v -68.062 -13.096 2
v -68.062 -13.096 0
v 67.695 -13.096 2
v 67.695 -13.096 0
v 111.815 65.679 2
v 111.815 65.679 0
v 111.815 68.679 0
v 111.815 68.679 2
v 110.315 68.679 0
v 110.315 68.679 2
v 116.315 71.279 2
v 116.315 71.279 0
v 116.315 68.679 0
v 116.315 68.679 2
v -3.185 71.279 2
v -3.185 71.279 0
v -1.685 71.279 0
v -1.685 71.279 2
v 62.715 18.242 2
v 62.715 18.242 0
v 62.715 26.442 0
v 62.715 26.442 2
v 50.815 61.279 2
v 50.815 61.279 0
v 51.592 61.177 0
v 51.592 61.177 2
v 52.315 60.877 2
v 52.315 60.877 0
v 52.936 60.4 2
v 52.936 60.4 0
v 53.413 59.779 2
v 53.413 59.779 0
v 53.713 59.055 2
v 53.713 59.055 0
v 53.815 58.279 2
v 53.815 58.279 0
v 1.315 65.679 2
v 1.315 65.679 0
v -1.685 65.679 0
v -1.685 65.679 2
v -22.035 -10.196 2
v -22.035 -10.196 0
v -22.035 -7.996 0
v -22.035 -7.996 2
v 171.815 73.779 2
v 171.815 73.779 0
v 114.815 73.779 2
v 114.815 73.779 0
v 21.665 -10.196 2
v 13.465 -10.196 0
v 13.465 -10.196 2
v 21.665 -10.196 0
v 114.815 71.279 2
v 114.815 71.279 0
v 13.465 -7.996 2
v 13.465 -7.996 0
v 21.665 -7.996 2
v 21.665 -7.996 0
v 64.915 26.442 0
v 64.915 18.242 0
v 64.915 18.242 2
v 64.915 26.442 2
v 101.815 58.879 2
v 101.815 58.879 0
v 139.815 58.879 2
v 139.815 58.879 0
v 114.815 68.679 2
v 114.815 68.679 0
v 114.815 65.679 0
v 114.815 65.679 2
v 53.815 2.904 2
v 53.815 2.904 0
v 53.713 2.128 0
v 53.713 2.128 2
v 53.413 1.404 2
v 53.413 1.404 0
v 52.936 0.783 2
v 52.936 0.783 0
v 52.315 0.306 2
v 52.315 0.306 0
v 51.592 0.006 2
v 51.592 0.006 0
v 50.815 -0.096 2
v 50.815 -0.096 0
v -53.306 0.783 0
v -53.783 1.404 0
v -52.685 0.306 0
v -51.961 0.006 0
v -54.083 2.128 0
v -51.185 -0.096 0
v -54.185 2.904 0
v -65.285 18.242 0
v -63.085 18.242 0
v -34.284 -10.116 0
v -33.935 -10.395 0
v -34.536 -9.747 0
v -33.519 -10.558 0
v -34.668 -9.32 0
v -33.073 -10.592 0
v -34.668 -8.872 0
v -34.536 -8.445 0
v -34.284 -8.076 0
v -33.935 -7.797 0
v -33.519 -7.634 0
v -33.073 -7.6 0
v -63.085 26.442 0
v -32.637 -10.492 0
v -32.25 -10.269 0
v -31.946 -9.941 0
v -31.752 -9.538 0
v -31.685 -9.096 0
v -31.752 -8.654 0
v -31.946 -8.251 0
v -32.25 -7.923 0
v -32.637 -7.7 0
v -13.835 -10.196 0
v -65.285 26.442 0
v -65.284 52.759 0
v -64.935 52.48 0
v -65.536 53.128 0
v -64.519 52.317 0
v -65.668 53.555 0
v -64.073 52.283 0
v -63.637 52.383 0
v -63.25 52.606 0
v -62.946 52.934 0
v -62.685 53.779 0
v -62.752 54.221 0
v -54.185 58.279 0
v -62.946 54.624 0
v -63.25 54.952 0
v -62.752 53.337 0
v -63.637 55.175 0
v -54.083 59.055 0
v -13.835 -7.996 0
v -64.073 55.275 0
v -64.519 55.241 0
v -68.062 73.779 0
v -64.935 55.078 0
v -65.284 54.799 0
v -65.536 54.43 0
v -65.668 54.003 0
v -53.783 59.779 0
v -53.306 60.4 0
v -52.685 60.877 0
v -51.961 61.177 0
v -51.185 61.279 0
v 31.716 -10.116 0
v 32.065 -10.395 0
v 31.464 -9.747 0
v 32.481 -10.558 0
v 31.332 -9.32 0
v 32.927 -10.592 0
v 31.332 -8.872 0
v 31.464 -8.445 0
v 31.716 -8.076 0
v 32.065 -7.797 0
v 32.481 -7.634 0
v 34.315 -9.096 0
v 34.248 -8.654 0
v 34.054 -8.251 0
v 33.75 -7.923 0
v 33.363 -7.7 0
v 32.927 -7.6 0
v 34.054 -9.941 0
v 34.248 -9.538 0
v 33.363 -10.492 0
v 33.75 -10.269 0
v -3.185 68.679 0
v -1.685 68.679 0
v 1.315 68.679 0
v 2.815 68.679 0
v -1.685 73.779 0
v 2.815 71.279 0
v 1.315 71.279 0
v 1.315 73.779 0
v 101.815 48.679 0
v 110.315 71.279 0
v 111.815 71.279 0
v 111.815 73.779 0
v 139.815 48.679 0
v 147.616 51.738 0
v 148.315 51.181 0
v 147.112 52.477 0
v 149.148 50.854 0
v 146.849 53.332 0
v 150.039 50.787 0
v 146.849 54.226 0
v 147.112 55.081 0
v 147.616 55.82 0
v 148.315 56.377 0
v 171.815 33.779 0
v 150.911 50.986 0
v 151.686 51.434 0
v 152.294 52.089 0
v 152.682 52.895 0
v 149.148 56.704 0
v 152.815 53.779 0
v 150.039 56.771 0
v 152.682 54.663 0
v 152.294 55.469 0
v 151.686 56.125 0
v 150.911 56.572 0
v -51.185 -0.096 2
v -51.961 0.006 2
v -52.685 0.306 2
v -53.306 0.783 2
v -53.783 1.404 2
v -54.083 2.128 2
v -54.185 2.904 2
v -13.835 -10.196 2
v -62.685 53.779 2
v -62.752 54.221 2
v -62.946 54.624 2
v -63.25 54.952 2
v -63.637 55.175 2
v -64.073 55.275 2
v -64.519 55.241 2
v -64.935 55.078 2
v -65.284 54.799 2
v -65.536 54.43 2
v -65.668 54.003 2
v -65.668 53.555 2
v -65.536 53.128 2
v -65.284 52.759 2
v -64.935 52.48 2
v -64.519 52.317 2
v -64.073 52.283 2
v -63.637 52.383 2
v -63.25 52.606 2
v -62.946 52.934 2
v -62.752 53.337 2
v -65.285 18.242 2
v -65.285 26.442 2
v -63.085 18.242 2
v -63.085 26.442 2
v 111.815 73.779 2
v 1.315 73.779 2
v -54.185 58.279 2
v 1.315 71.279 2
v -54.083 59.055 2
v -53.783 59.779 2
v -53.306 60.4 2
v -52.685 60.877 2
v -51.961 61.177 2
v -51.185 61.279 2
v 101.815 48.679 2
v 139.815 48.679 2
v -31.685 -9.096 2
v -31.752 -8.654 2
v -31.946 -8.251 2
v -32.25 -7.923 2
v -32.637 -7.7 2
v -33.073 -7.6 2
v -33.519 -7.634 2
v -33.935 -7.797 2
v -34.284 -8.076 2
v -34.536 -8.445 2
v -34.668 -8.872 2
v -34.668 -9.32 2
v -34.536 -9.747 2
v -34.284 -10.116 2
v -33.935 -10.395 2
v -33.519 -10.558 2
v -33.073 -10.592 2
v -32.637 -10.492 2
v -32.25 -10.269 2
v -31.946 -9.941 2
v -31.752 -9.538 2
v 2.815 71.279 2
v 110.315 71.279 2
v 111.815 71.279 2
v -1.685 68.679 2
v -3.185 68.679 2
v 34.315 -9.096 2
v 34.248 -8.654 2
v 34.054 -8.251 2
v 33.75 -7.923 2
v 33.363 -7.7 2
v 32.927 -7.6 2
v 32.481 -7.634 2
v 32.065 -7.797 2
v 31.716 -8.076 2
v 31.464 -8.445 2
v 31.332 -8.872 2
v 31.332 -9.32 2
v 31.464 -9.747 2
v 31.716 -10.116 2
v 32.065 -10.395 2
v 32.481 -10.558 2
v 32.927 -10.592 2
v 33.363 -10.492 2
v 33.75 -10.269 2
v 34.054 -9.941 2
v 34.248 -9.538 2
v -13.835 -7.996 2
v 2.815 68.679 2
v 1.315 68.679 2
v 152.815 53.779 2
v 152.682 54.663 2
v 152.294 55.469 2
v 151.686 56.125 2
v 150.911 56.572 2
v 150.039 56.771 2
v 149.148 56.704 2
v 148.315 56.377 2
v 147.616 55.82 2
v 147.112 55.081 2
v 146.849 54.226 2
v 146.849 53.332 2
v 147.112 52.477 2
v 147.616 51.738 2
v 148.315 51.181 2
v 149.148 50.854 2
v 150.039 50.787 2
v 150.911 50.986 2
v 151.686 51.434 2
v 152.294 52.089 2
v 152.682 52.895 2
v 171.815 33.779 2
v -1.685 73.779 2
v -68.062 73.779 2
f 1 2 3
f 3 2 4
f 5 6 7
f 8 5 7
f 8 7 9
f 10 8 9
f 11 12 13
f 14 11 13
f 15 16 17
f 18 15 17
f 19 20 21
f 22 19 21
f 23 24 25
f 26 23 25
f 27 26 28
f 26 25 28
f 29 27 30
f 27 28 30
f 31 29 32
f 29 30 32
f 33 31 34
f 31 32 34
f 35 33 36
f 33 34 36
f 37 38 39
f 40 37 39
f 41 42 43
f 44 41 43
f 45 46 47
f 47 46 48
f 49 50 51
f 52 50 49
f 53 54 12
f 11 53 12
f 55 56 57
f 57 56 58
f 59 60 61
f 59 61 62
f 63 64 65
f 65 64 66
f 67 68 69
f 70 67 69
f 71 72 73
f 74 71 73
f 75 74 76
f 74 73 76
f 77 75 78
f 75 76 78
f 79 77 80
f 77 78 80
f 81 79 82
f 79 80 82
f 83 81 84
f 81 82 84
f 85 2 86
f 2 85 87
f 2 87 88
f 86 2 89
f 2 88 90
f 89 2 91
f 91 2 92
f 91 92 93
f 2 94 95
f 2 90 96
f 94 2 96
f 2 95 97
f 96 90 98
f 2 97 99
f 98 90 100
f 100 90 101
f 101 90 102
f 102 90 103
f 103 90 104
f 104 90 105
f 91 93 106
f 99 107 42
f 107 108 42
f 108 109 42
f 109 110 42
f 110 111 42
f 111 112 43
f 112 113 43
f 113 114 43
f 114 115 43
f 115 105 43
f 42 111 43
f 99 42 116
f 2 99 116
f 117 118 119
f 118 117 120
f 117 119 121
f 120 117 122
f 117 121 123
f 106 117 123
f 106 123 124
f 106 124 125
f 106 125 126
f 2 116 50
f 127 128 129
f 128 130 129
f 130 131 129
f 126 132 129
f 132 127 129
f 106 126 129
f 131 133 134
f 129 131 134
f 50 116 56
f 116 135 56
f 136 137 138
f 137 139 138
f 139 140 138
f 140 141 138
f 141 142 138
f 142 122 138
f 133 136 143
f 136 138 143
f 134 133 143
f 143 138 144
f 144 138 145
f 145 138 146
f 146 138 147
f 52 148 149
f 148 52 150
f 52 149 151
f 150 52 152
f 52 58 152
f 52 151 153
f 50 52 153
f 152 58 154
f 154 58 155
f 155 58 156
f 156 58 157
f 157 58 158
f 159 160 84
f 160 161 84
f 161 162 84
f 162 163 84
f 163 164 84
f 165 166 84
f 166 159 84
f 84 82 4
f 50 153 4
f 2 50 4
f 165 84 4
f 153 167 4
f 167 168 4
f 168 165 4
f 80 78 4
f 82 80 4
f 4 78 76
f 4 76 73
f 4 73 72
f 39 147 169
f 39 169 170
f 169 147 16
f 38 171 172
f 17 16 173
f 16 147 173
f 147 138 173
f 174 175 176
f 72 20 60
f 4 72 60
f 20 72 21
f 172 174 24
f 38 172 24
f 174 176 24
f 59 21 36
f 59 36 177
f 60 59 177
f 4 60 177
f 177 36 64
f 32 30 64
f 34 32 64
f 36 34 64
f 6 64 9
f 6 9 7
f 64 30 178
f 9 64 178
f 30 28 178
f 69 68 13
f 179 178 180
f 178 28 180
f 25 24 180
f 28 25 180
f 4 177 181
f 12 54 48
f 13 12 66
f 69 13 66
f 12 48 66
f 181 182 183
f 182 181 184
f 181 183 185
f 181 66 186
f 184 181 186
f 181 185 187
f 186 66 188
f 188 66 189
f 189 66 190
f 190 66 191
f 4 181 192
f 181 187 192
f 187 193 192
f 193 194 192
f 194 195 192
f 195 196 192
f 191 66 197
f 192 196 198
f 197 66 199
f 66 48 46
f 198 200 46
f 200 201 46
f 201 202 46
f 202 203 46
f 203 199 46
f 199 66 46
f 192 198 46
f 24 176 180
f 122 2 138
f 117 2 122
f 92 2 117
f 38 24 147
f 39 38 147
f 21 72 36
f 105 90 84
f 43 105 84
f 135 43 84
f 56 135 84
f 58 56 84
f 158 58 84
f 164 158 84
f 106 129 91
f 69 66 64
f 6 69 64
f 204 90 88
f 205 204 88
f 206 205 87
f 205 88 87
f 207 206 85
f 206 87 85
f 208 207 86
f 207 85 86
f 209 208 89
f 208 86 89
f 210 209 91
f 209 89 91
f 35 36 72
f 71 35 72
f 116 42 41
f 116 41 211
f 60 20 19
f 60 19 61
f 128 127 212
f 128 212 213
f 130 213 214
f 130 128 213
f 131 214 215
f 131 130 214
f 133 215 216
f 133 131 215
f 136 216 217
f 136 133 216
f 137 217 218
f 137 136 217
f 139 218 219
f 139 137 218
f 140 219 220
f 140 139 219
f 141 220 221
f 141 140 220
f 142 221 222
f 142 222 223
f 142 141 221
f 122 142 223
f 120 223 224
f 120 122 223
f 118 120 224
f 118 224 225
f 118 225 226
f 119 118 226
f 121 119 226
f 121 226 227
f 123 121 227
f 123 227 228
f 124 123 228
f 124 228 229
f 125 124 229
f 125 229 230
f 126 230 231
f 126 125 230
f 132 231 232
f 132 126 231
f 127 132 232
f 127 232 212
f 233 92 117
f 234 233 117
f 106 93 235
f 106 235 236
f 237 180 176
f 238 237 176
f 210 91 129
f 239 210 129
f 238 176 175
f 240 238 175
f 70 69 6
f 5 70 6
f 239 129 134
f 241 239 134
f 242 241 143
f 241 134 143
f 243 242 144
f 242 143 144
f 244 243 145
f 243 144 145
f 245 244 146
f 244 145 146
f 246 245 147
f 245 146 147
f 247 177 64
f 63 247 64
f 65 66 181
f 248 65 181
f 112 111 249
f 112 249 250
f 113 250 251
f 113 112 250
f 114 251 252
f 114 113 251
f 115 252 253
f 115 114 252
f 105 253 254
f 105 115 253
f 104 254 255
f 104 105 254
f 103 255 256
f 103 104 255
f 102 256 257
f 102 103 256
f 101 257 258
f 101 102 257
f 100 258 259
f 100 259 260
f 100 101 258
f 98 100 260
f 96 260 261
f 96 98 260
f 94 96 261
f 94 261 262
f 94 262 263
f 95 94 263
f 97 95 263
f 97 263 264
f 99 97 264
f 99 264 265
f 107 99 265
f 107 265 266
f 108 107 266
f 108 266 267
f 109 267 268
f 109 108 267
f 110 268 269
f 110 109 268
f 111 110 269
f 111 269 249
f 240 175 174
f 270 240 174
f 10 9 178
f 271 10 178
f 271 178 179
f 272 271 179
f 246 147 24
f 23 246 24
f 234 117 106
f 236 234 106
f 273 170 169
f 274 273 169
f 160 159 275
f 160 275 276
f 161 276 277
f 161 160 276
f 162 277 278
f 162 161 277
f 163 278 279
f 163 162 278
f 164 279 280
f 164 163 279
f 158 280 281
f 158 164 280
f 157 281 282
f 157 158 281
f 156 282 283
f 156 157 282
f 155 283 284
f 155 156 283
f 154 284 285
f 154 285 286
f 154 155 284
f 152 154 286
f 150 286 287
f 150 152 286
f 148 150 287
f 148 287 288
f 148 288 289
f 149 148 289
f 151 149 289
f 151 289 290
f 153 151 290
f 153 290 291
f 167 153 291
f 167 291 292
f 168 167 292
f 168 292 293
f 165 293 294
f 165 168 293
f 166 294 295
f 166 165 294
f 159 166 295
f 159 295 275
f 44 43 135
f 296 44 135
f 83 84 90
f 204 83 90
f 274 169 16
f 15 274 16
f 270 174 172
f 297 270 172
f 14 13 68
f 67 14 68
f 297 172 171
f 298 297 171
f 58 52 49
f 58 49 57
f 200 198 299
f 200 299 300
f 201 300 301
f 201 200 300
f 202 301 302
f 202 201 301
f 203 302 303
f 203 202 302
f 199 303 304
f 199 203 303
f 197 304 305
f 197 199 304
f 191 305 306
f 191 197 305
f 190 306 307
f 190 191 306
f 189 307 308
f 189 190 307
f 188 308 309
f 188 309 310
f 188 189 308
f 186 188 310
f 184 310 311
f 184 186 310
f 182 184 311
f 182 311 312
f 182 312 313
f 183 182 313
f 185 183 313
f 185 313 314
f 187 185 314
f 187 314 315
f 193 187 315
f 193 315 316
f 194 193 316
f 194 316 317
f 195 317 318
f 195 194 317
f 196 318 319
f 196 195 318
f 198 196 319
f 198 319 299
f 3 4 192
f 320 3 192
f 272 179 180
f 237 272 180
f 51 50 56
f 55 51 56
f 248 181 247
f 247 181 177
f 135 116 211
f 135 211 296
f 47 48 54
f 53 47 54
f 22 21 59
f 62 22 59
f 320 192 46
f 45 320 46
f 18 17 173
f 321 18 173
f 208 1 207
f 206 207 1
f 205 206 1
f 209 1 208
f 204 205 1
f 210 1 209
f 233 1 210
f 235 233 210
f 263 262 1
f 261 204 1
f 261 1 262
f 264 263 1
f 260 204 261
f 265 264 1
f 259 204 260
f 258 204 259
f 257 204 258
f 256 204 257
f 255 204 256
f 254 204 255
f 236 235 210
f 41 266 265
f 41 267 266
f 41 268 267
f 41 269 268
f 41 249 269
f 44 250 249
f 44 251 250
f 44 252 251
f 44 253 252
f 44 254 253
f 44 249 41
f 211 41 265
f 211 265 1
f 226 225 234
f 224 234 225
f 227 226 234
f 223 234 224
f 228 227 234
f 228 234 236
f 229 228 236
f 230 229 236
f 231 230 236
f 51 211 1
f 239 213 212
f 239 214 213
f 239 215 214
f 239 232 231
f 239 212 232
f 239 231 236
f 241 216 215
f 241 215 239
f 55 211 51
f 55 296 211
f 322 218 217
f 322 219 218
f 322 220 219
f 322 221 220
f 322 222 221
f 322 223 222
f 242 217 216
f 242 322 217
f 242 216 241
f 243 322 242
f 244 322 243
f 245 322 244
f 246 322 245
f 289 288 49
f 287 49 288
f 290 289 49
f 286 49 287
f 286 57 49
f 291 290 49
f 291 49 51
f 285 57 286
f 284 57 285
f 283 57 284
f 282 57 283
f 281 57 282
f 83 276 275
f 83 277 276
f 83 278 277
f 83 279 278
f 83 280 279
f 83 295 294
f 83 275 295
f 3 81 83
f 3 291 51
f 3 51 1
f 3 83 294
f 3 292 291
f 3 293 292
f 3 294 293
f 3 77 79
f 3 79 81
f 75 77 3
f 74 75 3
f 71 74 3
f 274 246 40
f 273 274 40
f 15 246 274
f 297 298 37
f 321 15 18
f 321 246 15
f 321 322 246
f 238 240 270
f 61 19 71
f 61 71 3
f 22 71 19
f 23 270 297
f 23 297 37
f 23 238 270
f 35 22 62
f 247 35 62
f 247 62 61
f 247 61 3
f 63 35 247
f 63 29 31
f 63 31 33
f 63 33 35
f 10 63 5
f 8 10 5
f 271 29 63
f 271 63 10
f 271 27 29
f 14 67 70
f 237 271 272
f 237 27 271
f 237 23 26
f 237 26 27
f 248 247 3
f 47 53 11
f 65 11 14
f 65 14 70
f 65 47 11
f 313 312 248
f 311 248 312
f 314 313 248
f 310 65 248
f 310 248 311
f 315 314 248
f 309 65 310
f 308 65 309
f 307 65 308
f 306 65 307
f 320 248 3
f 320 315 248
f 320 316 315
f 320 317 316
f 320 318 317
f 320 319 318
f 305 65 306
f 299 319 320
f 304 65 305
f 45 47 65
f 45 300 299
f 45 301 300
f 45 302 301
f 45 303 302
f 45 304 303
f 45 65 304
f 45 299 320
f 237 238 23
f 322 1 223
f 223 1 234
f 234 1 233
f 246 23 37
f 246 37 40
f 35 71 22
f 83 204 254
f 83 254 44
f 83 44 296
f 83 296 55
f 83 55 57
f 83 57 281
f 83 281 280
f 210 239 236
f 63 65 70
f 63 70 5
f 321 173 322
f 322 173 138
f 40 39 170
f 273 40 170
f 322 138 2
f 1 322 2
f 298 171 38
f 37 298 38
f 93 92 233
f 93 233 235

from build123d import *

# Parameters (mm, degrees)
SKETCH_1_R      = 1.5
SKETCH_1_W      = 8.2
SKETCH_1_H      = 2.2
SKETCH_1_W_2    = 2.2
SKETCH_1_H_2    = 8.2
SKETCH_1_R_2    = 3
EXTRUDE_1_DEPTH = 2


with BuildPart() as part:
    # 草图1 → 凸台-拉伸1 (new body)
    with BuildSketch(Plane.XY):
        Polygon((-68.061769393, -13.095981945), (-52.184883937, -13.095981945), (-18.934883937, -13.095981945), (18.565116063, -13.095981945), (67.695116063, -13.095981945), (171.815116063, 33.779018055), (171.815116063, 73.779018055), (114.815116063, 73.779018055), (114.815116063, 71.279018055), (116.315116063, 71.279018055), (116.315116063, 68.679018055), (114.815116063, 68.679018055), (114.815116063, 65.679018055), (111.815116063, 65.679018055), (111.815116063, 68.679018055), (110.315116063, 68.679018055), (110.315116063, 71.279018055), (111.815116063, 71.279018055), (111.815116063, 73.779018055), (1.315116063, 73.779018055), (1.315116063, 71.279018055), (2.815116063, 71.279018055), (2.815116063, 68.679018055), (1.315116063, 68.679018055), (1.315116063, 65.679018055), (-1.684883937, 65.679018055), (-1.684883937, 68.679018055), (-3.184883937, 68.679018055), (-3.184883937, 71.279018055), (-1.684883937, 71.279018055), (-1.684883937, 73.779018055), (-68.061769393, 73.779018055), align=None)
        with Locations((-33.184883937, -9.095981945)):
            Circle(SKETCH_1_R, mode=Mode.SUBTRACT)
        with Locations((-17.934883937, -9.095981946)):
            Rectangle(SKETCH_1_W, SKETCH_1_H, mode=Mode.SUBTRACT)
        with Locations((17.565116063, -9.095981946)):
            Rectangle(SKETCH_1_W, SKETCH_1_H, mode=Mode.SUBTRACT)
        with Locations((32.815116063, -9.095981945)):
            Circle(SKETCH_1_R, mode=Mode.SUBTRACT)
        with Locations((-64.184883937, 22.341518055)):
            Rectangle(SKETCH_1_W_2, SKETCH_1_H_2, mode=Mode.SUBTRACT)
        with Locations((63.815116063, 22.341518055)):
            Rectangle(SKETCH_1_W_2, SKETCH_1_H_2, mode=Mode.SUBTRACT)
        with BuildLine():
            ThreePointArc((50.815116063, 61.279018055), (52.936436406, 60.400338398), (53.815116063, 58.279018055))
            Line((53.815116063, 58.279018055), (53.815116063, 2.904018055))
            ThreePointArc((53.815116063, 2.904018055), (52.936436406, 0.782697711), (50.815116063, -0.095981945))
            Line((50.815116063, -0.095981945), (-51.184883937, -0.095981945))
            ThreePointArc((-51.184883937, -0.095981945), (-53.306204281, 0.782697711), (-54.184883937, 2.904018055))
            Line((-54.184883937, 2.904018055), (-54.184883937, 58.279018055))
            ThreePointArc((-54.184883937, 58.279018055), (-53.306204281, 60.400338398), (-51.184883937, 61.279018055))
            Line((-51.184883937, 61.279018055), (50.815116063, 61.279018055))
        make_face(mode=Mode.SUBTRACT)
        with Locations((-64.184883937, 53.779018055)):
            Circle(SKETCH_1_R, mode=Mode.SUBTRACT)
        Polygon((139.815116063, 48.679018055), (124.815116063, 48.679018055), (101.815116063, 48.679018055), (101.815116063, 58.879018055), (124.815116063, 58.879018055), (139.815116063, 58.879018055), align=None, mode=Mode.SUBTRACT)
        with Locations((149.815116063, 53.779018055)):
            Circle(SKETCH_1_R_2, mode=Mode.SUBTRACT)
    extrude(amount=EXTRUDE_1_DEPTH)


solid = part.part
